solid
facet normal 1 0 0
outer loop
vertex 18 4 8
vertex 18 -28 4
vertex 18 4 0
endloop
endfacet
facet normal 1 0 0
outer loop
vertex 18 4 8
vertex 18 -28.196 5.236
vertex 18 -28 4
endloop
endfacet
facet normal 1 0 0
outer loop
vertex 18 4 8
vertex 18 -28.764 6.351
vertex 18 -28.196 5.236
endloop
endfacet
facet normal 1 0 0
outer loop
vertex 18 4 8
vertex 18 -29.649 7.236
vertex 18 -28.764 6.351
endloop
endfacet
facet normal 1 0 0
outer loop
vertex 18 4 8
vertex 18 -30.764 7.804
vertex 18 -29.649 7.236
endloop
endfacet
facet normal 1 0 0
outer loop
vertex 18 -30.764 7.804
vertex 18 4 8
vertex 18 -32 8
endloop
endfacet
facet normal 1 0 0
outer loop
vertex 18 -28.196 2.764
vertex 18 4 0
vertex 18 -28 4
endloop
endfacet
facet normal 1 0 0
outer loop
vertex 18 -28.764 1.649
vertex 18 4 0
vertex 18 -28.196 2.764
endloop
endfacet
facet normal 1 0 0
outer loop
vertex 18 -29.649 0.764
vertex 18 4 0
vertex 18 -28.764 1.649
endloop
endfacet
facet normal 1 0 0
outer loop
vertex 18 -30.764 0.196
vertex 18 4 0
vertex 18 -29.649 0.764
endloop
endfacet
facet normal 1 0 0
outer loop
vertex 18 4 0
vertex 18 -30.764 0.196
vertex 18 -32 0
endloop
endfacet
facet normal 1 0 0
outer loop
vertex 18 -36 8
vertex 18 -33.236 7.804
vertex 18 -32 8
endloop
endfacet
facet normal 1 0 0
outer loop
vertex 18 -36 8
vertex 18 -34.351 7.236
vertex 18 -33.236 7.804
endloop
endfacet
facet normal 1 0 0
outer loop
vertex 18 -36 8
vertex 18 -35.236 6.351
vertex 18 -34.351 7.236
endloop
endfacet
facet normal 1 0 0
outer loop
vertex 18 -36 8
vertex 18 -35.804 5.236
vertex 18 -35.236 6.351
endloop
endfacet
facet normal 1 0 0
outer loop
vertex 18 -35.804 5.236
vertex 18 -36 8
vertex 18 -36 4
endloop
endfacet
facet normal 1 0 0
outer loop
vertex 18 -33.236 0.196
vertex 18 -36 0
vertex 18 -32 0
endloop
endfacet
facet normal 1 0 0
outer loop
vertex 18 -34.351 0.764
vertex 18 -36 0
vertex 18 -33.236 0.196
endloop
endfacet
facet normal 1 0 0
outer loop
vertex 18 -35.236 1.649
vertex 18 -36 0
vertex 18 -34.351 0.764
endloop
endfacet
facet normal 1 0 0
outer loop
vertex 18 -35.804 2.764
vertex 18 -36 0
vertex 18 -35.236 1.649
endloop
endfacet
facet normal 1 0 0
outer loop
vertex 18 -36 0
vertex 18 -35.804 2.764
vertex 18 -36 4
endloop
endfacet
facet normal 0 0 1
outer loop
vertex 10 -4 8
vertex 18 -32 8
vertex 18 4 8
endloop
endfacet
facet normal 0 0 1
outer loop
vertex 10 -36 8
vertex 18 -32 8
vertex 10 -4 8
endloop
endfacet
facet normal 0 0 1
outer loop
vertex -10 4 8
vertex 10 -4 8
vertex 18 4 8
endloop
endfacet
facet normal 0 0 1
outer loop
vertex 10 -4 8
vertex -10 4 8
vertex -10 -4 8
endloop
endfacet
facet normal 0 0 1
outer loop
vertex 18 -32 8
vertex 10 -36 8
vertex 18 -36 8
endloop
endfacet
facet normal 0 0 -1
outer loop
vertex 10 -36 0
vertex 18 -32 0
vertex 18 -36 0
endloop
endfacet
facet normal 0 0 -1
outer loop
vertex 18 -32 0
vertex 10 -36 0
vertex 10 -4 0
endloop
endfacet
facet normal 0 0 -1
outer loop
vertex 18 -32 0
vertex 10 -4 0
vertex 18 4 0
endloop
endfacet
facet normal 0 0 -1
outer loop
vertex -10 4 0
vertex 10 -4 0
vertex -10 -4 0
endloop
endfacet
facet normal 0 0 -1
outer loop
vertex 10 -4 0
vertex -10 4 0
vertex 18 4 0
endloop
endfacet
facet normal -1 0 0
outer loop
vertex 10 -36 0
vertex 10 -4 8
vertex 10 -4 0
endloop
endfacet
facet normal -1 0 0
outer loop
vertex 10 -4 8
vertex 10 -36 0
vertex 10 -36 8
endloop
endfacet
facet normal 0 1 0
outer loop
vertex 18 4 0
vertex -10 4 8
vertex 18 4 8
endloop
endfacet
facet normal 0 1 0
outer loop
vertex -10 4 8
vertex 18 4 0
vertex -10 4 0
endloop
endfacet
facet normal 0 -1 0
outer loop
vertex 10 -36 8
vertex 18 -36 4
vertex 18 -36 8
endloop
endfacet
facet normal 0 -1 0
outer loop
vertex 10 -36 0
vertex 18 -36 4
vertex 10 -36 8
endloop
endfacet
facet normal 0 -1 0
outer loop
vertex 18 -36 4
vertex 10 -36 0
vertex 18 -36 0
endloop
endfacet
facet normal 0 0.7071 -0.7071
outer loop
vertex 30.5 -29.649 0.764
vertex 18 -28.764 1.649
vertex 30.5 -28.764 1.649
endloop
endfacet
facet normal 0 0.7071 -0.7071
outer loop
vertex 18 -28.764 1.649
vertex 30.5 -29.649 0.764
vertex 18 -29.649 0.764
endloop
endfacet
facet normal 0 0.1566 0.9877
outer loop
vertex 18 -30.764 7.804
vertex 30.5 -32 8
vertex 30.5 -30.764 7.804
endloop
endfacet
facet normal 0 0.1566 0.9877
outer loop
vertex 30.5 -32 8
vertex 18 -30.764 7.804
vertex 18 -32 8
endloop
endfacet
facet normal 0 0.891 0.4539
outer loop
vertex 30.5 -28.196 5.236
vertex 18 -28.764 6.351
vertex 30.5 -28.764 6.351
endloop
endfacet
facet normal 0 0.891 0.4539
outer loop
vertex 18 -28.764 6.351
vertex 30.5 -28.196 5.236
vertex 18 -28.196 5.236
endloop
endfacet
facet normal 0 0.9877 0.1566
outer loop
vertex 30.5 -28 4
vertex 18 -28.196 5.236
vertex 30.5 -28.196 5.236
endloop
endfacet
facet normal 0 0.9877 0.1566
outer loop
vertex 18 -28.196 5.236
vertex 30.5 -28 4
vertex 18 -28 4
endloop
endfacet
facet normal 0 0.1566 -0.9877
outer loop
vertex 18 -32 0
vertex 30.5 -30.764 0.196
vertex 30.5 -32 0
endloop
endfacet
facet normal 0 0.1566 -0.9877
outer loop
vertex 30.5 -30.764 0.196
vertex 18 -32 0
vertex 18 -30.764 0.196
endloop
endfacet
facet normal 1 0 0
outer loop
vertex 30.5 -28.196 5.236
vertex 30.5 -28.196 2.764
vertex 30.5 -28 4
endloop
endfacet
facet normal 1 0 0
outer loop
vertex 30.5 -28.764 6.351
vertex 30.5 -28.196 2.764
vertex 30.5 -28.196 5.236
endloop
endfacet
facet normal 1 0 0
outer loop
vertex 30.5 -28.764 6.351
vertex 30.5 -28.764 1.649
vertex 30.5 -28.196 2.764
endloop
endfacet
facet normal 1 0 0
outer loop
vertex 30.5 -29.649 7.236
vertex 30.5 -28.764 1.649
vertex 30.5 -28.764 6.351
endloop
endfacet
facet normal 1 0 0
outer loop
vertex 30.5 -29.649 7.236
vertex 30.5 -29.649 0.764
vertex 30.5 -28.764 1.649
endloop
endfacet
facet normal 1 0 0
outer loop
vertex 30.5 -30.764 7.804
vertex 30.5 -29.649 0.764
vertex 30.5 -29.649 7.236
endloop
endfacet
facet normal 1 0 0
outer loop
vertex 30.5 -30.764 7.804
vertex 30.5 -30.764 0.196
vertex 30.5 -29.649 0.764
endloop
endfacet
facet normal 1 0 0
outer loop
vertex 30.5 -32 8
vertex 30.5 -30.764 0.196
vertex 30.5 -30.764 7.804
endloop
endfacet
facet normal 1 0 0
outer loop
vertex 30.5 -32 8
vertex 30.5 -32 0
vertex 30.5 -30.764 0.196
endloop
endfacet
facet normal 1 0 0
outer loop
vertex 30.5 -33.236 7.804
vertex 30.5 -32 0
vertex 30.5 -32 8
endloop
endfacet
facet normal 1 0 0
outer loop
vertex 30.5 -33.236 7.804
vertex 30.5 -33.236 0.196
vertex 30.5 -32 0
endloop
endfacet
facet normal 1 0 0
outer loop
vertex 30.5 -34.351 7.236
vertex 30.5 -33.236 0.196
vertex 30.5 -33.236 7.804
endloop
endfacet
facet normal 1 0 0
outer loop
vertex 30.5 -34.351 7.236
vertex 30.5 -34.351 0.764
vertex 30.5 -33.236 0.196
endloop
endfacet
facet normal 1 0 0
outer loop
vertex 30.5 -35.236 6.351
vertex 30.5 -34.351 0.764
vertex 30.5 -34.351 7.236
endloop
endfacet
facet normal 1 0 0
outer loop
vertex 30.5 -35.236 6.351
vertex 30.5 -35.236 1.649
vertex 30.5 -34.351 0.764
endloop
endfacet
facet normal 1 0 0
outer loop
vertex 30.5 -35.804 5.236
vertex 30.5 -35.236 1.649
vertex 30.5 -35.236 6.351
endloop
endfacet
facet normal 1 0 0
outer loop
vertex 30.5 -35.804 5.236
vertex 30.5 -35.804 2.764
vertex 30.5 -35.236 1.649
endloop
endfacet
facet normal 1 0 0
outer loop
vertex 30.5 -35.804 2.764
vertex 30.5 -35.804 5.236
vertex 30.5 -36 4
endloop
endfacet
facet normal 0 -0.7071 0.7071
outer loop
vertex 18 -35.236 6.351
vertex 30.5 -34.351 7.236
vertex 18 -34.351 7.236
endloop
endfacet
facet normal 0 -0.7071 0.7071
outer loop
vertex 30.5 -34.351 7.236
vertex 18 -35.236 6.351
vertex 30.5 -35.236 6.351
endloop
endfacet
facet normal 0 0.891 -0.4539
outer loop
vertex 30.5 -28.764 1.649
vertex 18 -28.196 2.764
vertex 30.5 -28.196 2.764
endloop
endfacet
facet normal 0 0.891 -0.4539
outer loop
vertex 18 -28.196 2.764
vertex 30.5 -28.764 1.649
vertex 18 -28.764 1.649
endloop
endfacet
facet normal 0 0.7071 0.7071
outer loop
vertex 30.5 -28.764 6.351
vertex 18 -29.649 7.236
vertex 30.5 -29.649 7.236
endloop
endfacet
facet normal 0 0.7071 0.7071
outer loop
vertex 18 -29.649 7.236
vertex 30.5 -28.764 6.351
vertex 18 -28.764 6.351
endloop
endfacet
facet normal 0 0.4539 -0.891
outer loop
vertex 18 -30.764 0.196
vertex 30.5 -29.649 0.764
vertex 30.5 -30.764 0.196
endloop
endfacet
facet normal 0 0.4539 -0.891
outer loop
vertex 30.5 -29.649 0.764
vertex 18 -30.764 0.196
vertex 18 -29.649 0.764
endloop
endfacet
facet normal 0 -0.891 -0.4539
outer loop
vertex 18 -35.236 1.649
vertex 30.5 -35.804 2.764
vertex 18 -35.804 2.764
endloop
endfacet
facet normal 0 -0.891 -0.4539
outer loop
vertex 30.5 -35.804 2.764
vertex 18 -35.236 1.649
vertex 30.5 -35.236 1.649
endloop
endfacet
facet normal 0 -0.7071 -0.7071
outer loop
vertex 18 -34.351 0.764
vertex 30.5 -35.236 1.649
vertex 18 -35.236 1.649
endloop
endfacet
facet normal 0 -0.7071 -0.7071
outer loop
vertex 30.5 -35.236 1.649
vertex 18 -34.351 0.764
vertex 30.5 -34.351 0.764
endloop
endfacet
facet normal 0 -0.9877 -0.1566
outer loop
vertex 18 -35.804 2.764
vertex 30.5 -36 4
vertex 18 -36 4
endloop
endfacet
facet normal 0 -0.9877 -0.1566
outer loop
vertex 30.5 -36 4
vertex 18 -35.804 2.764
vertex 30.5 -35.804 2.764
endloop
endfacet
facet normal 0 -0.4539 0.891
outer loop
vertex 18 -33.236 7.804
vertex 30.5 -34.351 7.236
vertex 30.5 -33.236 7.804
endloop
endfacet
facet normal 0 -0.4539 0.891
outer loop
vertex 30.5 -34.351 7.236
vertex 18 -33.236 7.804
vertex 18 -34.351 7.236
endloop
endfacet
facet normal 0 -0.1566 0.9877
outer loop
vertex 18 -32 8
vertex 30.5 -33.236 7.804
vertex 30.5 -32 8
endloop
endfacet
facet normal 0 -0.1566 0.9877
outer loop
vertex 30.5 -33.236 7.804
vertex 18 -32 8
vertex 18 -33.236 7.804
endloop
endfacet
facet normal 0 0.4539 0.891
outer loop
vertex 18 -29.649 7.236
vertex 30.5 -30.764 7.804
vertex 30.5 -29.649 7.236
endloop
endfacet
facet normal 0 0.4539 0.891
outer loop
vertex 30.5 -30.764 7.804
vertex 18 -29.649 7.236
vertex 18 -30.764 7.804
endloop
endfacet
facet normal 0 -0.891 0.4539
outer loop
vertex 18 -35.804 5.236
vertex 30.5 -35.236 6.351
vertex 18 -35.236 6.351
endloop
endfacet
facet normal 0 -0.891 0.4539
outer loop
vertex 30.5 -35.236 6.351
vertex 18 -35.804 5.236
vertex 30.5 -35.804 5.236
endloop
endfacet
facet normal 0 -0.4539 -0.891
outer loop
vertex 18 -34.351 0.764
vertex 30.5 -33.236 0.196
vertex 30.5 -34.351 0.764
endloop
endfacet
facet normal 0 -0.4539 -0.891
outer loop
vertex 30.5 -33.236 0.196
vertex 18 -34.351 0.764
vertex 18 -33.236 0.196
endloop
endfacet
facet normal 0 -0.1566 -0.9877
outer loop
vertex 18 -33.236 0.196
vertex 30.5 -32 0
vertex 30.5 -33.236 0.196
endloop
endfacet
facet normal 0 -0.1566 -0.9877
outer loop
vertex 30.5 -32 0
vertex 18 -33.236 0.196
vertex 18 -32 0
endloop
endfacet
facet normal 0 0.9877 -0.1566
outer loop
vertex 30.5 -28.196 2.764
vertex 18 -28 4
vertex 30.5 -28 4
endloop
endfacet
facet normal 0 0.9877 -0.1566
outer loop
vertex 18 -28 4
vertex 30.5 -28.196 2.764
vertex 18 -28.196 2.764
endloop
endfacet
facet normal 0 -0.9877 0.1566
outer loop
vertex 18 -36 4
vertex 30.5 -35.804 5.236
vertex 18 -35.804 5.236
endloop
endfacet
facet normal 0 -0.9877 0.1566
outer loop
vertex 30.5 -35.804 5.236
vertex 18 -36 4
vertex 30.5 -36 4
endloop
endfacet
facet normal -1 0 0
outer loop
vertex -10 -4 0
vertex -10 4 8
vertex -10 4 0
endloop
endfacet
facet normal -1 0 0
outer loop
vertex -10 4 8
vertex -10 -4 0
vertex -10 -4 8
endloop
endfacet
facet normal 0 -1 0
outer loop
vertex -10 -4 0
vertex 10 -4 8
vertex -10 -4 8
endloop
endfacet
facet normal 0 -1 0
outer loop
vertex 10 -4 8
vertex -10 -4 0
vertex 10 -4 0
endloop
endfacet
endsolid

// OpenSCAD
holder_length = 85;
holder_width = 13;
holder_height = 13;

gear_distance = 38;
gear_tab_diameter = 15;

brace_width = 7.5;
brace_height = 7;

crank_size = 8;
crank_length = 20;

//translate([0, 0, holder_height/2]) bottom();
//translate([0, 0, holder_height/2]) top();
translate([0, 0, crank_size/2]) crank();
//gear();

module gear() {
	difference() {
		union() {
			import_stl("gears.stl", convexity = 20);
			translate([0, 0, 3.75]) cube([30, 30, 7.5], center = true);
		}
		translate([0, 0, -1]) cylinder(5+1, gear_tab_diameter/2, gear_tab_diameter/2);
		translate([0, 0, 10]) cube([crank_size, crank_size, 20], center = true);
	}
}

module crank() {
	union() {
		cube([crank_length, crank_size, crank_size], center = true);
		translate([crank_length/2+crank_size/2, -crank_length*2/2+crank_size/2, 0]) {
			cube([crank_size, crank_length*2, crank_size], center = true);
			rotate([0, 90, 0]) {
				translate([0, -crank_length+crank_size/2, crank_length/2/2/2+crank_size/2]) {
					cylinder(crank_length, crank_size/2, crank_size/2, center = true, $fn=20);
				}
			}
		}
	}
}

module top() {
	difference() {
		bottom();
		translate([+gear_distance/2, 0, 0])
			cylinder(holder_height*2, gear_tab_diameter/2, gear_tab_diameter/2, center = true);
		translate([+gear_distance/2, 0, 5])
			cylinder(holder_height, gear_tab_diameter+0.5, gear_tab_diameter+0.5, center = true);
	}
}

module bottom() {
	difference() {
		union() {
			cube([holder_length, holder_width, holder_height], center= true);

			translate([-gear_distance/2, 0, 0])
				cylinder(holder_height, gear_tab_diameter, gear_tab_diameter, center = true);

			translate([+gear_distance/2, 0, 0]) {
				cylinder(holder_height, gear_tab_diameter, gear_tab_diameter, center = true);
				translate([0, 0, +3]) {
					cylinder(holder_height, gear_tab_diameter/2, gear_tab_diameter/2, center = true);
				}
			}
		}

		translate([-gear_distance/2, 0, 0])
			cylinder(holder_height+2, gear_tab_diameter/2, gear_tab_diameter/2, center = true);

		translate([-holder_length/2-5.5+10, 0, 0])
			cube([11, brace_width, brace_height], center = true);

		translate([+holder_length/2+5.5-10, 0, 0])
			cube([11, brace_width, brace_height], center = true);
	}
}
